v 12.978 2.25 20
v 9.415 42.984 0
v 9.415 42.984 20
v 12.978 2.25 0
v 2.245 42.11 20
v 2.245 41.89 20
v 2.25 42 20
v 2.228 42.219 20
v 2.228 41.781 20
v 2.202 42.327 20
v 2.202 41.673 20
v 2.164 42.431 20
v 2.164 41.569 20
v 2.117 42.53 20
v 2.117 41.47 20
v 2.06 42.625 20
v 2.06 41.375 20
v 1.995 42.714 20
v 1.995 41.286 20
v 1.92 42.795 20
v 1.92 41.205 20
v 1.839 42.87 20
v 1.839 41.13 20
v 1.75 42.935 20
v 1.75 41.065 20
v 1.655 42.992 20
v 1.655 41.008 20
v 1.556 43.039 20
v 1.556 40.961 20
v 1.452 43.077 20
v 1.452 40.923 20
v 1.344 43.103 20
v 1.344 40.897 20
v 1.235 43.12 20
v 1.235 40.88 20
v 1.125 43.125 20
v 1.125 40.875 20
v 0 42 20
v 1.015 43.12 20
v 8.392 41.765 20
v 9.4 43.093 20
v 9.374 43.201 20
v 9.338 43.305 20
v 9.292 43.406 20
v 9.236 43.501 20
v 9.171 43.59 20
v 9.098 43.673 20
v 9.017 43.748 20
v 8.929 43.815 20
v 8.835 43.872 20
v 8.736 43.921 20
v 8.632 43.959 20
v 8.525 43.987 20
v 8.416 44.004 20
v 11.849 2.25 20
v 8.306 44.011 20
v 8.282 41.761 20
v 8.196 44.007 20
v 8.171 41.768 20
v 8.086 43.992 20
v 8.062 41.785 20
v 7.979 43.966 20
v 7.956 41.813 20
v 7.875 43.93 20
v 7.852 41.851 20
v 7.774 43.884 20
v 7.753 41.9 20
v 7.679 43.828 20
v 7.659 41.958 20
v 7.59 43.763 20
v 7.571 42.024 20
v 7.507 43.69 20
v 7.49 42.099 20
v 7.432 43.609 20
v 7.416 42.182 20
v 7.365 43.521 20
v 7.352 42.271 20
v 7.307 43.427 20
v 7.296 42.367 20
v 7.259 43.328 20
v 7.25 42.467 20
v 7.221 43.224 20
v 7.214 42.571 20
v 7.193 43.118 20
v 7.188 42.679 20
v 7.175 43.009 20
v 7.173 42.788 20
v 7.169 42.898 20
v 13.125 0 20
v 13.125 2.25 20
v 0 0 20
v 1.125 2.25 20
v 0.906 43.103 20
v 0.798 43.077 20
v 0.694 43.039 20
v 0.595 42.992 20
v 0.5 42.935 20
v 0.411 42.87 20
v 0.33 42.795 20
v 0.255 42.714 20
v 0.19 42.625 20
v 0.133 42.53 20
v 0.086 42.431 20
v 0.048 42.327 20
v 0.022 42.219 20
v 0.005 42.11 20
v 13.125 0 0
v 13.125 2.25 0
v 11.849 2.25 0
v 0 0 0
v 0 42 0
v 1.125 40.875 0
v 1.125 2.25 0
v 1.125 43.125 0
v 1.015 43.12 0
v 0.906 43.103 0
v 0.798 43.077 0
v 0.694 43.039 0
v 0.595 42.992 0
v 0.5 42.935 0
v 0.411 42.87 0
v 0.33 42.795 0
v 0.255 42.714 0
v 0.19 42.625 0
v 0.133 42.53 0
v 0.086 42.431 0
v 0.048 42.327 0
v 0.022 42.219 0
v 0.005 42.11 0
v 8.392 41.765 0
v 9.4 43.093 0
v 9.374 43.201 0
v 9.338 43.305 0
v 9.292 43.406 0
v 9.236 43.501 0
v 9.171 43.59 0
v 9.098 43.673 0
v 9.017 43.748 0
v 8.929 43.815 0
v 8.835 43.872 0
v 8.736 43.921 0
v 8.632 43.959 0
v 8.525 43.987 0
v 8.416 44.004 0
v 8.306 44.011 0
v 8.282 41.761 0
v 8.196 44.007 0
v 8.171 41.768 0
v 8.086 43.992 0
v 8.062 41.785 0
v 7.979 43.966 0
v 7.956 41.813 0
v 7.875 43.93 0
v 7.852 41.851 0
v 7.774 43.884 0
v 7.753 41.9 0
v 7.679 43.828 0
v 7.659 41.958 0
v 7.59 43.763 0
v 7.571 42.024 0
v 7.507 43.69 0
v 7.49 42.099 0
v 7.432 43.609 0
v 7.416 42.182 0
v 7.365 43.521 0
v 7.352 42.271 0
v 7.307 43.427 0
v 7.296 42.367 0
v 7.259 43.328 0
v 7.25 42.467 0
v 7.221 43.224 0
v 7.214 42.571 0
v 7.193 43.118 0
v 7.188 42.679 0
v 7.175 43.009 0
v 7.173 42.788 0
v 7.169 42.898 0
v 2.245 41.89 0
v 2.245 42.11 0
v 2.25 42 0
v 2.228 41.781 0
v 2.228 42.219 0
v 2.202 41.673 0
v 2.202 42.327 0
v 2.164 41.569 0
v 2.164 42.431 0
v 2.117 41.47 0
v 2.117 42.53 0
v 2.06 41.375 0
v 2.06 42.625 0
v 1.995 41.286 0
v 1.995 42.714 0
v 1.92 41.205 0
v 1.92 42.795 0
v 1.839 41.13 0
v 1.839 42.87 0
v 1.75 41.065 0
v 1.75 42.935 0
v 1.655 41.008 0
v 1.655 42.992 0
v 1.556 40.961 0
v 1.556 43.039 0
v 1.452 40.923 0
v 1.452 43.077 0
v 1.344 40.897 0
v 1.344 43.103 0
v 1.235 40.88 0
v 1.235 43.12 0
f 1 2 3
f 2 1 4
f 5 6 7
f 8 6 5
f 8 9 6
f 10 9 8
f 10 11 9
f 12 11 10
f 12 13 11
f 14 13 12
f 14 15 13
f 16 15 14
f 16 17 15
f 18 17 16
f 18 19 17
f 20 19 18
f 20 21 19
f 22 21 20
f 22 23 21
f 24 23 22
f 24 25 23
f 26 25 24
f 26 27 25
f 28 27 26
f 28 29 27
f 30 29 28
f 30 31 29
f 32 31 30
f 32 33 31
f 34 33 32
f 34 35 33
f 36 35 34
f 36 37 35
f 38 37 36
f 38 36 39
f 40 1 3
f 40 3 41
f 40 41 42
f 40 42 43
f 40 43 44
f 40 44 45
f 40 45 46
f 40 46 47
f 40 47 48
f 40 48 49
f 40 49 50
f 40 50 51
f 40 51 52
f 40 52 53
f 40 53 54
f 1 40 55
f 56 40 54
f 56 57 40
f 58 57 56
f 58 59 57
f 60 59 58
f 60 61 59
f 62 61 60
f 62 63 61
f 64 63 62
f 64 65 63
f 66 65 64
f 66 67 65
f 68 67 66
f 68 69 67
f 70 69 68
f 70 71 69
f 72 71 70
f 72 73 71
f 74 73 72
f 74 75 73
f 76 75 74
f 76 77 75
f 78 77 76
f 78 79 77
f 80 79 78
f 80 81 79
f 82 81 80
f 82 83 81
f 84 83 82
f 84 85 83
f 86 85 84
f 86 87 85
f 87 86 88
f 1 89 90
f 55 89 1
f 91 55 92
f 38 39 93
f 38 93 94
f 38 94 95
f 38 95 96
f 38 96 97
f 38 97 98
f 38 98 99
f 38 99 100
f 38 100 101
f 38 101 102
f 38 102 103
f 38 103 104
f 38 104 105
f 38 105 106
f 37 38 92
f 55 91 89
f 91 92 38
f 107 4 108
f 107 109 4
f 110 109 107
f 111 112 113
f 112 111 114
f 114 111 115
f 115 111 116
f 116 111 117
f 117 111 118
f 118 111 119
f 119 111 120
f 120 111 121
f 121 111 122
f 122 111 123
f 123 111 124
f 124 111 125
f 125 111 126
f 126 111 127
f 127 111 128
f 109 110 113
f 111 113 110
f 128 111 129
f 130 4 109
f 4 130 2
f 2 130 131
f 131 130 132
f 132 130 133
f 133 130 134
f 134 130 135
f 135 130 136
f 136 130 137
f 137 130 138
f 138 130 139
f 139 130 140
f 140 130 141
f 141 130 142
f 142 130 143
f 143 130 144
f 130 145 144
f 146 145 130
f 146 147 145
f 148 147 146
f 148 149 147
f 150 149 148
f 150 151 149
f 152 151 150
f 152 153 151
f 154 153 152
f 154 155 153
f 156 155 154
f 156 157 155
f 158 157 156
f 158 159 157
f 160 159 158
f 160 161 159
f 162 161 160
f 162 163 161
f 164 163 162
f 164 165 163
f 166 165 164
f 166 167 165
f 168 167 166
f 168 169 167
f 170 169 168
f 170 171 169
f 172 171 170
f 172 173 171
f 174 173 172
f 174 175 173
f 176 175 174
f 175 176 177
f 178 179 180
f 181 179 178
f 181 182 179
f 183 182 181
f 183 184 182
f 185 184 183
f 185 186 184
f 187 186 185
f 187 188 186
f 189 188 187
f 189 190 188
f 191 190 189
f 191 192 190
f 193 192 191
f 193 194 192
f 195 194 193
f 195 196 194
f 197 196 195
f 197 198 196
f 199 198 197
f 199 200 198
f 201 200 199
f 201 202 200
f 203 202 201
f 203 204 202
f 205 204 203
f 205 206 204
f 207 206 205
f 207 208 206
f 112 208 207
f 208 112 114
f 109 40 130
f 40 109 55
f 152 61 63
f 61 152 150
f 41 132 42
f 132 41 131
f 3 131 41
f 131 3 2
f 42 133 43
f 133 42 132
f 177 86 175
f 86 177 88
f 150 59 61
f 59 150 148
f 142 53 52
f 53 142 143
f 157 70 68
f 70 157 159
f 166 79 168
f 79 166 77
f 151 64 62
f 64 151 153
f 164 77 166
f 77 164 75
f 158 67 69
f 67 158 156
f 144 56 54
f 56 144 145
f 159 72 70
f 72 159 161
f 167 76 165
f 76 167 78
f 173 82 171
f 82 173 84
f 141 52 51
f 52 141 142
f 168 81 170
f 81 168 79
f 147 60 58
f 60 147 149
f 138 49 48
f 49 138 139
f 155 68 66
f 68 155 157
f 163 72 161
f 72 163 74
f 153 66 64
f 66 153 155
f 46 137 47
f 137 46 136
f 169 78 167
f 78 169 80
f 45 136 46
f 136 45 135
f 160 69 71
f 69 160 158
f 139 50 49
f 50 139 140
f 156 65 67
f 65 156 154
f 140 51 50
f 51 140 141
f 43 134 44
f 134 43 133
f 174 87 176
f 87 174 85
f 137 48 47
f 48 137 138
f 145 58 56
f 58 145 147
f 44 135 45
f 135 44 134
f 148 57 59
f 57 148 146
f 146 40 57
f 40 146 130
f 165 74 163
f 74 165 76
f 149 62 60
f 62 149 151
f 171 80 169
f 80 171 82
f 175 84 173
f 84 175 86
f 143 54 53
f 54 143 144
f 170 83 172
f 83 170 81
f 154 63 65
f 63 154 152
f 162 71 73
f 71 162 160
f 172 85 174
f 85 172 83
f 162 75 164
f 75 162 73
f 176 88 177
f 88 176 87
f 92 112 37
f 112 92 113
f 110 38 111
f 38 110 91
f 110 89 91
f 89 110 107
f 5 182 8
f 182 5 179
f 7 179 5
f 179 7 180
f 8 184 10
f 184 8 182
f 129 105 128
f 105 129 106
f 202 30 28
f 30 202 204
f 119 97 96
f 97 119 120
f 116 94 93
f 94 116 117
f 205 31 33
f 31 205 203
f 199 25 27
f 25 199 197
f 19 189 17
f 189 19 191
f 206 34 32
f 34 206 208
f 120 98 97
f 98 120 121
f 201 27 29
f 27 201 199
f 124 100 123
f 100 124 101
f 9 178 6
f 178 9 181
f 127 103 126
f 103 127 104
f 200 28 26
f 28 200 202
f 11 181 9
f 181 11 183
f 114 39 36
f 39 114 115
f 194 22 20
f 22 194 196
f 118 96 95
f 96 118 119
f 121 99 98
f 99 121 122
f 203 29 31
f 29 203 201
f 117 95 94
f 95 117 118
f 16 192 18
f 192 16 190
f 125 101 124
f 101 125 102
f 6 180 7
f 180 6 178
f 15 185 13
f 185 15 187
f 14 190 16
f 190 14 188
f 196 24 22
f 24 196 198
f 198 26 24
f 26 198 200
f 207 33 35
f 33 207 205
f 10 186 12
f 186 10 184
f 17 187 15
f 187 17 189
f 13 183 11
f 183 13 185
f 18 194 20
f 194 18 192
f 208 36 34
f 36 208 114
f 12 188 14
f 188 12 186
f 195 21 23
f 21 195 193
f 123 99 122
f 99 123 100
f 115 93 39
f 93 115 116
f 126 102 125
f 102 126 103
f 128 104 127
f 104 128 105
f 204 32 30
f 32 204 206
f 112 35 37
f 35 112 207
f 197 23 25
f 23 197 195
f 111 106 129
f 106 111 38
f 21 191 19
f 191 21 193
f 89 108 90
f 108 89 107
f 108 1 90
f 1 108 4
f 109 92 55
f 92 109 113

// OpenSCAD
first_layer_height = 0.20;
layer_height = 0.15;
layer_width = 0.45;

$fn = 64;

wall_thickness = 2.5*layer_width;
bottom_thickness = first_layer_height + 2*layer_height;

height = 20;

// canon strap
length = 42;
inner_space = 12;

// fender strap
//length = 50;
//inner_space = 18;

inwards_rotation = 5;

cube([wall_thickness, length, height]);
translate([wall_thickness,length,0])
cylinder(height, wall_thickness,wall_thickness);
    
cube([inner_space+wall_thickness,2*wall_thickness,height]);

rotate(inwards_rotation, [0,0,1])
translate([inner_space,0,0])
union() {
    cube([wall_thickness, length, height]);
    translate([0,length,0])
    cylinder(height, wall_thickness,wall_thickness);
}
